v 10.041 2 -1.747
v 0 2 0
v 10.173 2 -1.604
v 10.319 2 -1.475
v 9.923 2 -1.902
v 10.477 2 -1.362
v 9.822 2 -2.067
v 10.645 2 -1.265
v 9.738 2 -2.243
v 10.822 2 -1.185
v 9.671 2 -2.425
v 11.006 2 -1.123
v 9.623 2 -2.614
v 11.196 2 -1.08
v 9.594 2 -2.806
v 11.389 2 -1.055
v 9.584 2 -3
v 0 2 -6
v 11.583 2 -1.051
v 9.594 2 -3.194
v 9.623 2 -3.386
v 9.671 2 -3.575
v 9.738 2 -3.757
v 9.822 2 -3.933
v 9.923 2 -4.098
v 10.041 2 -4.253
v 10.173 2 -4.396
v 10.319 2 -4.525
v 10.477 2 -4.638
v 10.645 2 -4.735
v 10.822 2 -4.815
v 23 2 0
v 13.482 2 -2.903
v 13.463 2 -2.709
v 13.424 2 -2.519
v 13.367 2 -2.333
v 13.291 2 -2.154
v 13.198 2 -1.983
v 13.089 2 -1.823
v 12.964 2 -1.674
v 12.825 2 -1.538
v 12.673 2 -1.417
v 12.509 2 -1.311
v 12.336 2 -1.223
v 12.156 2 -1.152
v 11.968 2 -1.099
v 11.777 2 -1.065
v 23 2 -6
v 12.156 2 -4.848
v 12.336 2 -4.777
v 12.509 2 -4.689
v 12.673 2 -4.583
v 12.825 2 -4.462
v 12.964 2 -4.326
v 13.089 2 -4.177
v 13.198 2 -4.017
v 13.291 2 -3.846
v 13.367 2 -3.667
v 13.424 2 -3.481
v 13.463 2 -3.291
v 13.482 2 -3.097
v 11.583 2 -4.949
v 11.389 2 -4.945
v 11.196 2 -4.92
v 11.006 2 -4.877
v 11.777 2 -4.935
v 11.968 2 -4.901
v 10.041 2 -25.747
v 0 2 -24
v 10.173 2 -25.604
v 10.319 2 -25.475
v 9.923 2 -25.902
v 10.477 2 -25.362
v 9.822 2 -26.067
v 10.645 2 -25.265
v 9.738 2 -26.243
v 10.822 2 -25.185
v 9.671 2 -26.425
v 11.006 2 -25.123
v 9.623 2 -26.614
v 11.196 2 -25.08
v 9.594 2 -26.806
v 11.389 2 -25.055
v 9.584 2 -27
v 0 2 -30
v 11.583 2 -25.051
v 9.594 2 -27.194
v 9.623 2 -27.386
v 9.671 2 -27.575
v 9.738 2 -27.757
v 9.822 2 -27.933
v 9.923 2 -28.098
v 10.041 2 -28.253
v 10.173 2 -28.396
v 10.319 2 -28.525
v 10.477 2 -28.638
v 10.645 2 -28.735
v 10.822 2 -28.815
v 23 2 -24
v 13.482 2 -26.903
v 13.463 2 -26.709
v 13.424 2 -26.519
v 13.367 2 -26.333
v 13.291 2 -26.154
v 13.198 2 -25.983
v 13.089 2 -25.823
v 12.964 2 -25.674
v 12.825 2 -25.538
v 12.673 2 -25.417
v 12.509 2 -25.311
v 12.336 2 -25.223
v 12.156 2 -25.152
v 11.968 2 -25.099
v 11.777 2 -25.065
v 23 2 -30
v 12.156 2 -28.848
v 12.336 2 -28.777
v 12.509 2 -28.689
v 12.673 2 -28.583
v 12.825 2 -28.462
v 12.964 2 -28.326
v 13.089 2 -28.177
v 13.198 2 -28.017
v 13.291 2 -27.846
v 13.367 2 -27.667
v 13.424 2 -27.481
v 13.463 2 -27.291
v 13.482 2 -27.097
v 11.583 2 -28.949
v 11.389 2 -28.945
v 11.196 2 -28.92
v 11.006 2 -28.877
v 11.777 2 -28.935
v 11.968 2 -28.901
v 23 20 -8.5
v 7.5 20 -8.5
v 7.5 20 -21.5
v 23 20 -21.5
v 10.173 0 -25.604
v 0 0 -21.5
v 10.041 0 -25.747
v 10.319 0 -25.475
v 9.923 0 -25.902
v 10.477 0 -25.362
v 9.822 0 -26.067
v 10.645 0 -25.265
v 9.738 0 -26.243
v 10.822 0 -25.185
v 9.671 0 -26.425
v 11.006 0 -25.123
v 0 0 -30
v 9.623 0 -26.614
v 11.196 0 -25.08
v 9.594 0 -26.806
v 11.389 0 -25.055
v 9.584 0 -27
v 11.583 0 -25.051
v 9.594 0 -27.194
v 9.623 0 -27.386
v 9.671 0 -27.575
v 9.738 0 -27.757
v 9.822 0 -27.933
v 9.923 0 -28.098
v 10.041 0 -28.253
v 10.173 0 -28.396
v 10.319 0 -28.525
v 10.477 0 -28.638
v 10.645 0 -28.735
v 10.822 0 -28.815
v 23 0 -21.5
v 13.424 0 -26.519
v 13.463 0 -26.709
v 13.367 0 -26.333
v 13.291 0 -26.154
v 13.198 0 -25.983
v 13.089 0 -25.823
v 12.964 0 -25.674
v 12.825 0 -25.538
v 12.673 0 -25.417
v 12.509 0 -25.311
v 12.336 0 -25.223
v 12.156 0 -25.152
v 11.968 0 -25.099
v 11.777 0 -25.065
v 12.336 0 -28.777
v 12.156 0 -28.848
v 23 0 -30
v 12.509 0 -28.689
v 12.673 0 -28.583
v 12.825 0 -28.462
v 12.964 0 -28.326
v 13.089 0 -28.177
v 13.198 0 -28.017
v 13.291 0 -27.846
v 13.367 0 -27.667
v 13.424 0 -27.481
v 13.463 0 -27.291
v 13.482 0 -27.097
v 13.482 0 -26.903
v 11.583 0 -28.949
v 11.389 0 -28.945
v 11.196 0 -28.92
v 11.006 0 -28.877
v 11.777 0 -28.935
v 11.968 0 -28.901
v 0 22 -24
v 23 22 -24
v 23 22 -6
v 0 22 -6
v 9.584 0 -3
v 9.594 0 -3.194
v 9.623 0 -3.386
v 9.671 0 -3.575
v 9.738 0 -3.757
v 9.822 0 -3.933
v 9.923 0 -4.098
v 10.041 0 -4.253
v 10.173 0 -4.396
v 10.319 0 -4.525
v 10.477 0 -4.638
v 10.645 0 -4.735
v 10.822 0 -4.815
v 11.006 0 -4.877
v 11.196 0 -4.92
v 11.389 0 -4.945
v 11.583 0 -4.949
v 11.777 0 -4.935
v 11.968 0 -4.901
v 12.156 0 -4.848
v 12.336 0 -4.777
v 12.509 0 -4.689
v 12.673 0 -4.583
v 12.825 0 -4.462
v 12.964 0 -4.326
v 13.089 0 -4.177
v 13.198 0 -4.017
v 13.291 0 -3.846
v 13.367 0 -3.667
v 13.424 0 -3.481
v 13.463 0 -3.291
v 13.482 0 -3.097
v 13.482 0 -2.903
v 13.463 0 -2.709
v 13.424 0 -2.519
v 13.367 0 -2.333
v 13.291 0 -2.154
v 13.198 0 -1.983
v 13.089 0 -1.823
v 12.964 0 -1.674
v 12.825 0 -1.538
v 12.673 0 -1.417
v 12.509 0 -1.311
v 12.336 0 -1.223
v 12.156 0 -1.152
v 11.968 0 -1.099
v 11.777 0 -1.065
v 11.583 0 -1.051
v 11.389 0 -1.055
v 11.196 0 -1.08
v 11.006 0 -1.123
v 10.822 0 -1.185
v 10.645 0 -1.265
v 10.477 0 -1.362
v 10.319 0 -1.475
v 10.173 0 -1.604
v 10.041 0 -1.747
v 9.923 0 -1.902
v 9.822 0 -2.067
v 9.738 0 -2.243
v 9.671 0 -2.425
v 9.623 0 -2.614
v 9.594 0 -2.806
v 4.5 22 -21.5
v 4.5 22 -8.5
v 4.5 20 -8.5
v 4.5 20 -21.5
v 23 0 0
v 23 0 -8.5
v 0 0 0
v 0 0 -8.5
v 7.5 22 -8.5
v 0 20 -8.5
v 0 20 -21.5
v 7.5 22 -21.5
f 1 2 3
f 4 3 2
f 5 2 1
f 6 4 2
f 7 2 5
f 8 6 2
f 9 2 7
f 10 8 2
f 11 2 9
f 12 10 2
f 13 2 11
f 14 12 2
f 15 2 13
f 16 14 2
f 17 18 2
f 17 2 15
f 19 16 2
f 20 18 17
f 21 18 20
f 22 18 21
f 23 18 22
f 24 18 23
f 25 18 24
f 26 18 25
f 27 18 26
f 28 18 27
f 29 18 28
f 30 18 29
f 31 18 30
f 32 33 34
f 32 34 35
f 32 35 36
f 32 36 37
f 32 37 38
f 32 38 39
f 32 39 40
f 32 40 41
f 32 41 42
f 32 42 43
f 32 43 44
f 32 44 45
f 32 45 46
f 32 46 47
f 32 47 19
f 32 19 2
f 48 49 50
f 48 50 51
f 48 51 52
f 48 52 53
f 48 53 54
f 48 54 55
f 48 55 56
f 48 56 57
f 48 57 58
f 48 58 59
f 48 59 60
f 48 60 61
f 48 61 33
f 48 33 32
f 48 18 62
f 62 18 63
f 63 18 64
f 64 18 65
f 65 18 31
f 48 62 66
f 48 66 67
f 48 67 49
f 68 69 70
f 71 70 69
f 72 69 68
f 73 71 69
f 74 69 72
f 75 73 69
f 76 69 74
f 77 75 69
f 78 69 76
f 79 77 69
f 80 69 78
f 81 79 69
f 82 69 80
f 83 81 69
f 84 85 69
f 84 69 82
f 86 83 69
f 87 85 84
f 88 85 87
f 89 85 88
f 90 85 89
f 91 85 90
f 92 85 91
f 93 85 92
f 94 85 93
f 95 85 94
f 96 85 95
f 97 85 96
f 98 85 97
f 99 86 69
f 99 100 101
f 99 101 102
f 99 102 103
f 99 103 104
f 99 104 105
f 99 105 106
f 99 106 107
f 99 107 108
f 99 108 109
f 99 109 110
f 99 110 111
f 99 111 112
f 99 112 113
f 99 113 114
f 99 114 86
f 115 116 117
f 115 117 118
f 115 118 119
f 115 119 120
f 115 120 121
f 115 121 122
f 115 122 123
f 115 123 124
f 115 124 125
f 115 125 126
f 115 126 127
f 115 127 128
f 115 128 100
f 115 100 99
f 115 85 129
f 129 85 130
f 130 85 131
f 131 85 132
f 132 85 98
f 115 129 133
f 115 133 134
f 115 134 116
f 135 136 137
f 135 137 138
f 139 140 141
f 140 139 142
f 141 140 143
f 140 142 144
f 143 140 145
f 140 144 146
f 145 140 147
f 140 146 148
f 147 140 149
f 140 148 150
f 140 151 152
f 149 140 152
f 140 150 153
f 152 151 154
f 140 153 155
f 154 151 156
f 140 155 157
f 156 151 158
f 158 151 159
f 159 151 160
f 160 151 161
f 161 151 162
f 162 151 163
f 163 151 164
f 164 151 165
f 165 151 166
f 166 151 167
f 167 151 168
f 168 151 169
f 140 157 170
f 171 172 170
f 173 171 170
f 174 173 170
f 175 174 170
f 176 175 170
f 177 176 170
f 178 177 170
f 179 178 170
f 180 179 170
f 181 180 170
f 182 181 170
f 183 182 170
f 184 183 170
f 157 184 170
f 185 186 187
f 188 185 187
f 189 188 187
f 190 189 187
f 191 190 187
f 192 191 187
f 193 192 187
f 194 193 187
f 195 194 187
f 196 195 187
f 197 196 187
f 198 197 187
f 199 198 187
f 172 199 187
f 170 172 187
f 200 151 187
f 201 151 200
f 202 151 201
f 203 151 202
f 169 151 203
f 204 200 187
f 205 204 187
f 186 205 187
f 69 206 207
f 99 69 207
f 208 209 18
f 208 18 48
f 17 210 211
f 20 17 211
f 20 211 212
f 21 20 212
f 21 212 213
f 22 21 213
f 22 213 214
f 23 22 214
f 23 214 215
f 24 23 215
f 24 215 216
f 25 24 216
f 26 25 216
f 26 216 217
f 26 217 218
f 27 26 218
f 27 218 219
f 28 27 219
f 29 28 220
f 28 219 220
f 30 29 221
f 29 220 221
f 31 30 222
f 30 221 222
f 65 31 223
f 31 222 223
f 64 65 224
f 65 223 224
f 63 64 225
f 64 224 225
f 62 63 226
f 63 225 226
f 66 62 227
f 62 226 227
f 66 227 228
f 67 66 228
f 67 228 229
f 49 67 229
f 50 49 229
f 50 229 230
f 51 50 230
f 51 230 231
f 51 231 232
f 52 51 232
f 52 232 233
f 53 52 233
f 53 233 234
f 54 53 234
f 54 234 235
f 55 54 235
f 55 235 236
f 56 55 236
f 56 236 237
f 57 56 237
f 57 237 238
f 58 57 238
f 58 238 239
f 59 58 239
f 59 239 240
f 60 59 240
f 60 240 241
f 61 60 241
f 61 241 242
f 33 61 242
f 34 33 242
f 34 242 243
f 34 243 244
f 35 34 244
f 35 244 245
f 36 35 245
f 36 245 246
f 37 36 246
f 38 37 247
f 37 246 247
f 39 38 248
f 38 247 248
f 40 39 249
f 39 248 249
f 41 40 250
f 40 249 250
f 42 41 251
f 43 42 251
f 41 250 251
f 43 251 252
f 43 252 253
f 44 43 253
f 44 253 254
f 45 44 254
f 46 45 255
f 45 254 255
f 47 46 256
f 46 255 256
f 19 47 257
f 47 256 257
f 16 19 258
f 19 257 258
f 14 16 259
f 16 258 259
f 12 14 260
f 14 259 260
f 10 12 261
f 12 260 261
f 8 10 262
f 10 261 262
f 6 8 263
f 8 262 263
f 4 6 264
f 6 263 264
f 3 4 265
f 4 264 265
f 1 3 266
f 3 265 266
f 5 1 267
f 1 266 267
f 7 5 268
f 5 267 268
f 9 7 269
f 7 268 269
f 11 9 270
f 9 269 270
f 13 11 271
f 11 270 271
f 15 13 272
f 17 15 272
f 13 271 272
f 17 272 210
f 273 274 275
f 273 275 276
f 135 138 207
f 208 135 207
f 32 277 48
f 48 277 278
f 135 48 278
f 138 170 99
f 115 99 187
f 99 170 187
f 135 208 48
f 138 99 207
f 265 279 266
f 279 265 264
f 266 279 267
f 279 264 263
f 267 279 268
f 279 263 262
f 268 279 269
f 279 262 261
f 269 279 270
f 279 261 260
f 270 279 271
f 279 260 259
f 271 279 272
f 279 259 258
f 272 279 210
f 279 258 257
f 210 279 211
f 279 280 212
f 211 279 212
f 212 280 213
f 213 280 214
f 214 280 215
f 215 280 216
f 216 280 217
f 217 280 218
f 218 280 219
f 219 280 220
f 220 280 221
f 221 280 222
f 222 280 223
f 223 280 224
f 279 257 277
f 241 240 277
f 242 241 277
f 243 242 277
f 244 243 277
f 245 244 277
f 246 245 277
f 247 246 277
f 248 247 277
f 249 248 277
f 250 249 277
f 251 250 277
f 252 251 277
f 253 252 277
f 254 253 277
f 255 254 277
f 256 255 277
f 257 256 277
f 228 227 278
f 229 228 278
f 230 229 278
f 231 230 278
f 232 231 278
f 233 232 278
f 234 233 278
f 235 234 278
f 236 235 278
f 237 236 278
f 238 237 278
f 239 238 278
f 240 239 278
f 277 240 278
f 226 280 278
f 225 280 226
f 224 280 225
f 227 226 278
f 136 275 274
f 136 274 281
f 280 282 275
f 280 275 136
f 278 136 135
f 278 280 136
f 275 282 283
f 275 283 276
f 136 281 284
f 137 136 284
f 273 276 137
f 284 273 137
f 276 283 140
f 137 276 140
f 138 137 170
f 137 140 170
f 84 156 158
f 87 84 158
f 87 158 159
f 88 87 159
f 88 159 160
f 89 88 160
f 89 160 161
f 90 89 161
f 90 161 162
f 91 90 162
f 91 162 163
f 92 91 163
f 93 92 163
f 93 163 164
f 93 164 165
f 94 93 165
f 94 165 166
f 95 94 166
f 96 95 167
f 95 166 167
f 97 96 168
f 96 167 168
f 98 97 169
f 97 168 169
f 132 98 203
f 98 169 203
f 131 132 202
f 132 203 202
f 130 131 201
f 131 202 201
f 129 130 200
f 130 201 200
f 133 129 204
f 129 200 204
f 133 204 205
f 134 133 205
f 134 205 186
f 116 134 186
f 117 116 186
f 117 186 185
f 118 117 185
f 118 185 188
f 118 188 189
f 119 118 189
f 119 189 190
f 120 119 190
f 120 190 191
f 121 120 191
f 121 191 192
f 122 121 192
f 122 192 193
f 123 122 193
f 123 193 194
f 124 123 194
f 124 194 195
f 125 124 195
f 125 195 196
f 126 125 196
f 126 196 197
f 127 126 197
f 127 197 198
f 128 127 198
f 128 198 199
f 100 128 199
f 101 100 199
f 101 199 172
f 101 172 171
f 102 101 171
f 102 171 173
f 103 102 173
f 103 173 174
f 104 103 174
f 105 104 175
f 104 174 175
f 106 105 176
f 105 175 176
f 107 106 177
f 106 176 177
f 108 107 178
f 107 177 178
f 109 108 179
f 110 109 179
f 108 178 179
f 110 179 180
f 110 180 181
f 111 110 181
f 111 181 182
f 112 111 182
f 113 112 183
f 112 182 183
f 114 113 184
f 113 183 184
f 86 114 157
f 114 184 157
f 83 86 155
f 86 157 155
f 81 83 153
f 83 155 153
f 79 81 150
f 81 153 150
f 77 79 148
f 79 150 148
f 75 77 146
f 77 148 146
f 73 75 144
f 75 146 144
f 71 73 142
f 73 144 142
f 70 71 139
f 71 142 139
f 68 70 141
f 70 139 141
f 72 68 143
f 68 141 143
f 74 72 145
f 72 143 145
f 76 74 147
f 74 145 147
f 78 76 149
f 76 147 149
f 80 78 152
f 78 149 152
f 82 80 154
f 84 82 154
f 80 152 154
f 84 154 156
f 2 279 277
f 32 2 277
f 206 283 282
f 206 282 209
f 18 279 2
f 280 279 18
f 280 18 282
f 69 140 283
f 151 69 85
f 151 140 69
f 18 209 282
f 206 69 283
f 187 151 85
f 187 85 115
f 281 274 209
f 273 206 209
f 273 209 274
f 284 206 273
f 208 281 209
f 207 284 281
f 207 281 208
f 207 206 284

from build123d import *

# Parameters (mm, degrees)
ESQUISSE1_W             = 23
ESQUISSE1_H             = 30
BOSS_EXTRU_1_DEPTH      = 22
ESQUISSE2_W             = 23
ESQUISSE2_H             = 6
ENL_V_MAT_EXTRU_1_DEPTH = 20
D_GAGEMENT_M3_51_D      = 3.9
D_GAGEMENT_M3_51_DEPTH  = 5
D_GAGEMENT_M3_51_TIP    = 1.171678207
ESQUISSE5_W             = 3
ESQUISSE5_H             = 13
ENL_V_MAT_EXTRU_2_DEPTH = 23
ESQUISSE6_W             = 24.5
ESQUISSE6_H             = 13
ENL_V_MAT_EXTRU_3_DEPTH = 20


with BuildPart() as part:
    # Esquisse1 → Boss.-Extru.1 (new body)
    with BuildSketch(Plane(origin=(0, 0, 0), x_dir=(1, 0, 0), z_dir=(0, 1, 0))):
        with Locations((11.5, 15)):
            Rectangle(ESQUISSE1_W, ESQUISSE1_H)
    extrude(amount=BOSS_EXTRU_1_DEPTH)

    # Esquisse2 → Enlèv. mat.-Extru.1 (cut)
    with BuildSketch(Plane(origin=(0, 22, 0), x_dir=(1, 0, 0), z_dir=(0, 1, 0))):
        with Locations((11.5, 27)):
            Rectangle(ESQUISSE2_W, ESQUISSE2_H)
        with Locations((11.5, 3)):
            Rectangle(ESQUISSE2_W, ESQUISSE2_H)
    extrude(amount=-ENL_V_MAT_EXTRU_1_DEPTH, mode=Mode.SUBTRACT)

    # Dégagement M3.51
    with Locations(Plane(origin=(0, 2, 0), x_dir=(1, 0, 0), z_dir=(0, 1, 0))):
        with Locations((11.534470398, 27), (11.534470398, 3)):
            Hole(D_GAGEMENT_M3_51_D / 2, depth=D_GAGEMENT_M3_51_DEPTH)
            with Locations((0, 0, -(D_GAGEMENT_M3_51_DEPTH + D_GAGEMENT_M3_51_TIP / 2))):  # 118° drill point
                Cone(0, D_GAGEMENT_M3_51_D / 2, D_GAGEMENT_M3_51_TIP, mode=Mode.SUBTRACT)

    # Esquisse5 → Enlèv. mat.-Extru.2 (cut, through all)
    with BuildSketch(Plane(origin=(0, 22, 0), x_dir=(1, 0, 0), z_dir=(0, 1, 0))):
        with Locations((6, 15)):
            Rectangle(ESQUISSE5_W, ESQUISSE5_H)
    extrude(amount=-ENL_V_MAT_EXTRU_2_DEPTH, mode=Mode.SUBTRACT)

    # Esquisse6 → Enlèv. mat.-Extru.3 (cut)
    with BuildSketch(Plane.XZ):
        with Locations((12.25, -15)):
            Rectangle(ESQUISSE6_W, ESQUISSE6_H)
    extrude(amount=-ENL_V_MAT_EXTRU_3_DEPTH, mode=Mode.SUBTRACT)


solid = part.part
